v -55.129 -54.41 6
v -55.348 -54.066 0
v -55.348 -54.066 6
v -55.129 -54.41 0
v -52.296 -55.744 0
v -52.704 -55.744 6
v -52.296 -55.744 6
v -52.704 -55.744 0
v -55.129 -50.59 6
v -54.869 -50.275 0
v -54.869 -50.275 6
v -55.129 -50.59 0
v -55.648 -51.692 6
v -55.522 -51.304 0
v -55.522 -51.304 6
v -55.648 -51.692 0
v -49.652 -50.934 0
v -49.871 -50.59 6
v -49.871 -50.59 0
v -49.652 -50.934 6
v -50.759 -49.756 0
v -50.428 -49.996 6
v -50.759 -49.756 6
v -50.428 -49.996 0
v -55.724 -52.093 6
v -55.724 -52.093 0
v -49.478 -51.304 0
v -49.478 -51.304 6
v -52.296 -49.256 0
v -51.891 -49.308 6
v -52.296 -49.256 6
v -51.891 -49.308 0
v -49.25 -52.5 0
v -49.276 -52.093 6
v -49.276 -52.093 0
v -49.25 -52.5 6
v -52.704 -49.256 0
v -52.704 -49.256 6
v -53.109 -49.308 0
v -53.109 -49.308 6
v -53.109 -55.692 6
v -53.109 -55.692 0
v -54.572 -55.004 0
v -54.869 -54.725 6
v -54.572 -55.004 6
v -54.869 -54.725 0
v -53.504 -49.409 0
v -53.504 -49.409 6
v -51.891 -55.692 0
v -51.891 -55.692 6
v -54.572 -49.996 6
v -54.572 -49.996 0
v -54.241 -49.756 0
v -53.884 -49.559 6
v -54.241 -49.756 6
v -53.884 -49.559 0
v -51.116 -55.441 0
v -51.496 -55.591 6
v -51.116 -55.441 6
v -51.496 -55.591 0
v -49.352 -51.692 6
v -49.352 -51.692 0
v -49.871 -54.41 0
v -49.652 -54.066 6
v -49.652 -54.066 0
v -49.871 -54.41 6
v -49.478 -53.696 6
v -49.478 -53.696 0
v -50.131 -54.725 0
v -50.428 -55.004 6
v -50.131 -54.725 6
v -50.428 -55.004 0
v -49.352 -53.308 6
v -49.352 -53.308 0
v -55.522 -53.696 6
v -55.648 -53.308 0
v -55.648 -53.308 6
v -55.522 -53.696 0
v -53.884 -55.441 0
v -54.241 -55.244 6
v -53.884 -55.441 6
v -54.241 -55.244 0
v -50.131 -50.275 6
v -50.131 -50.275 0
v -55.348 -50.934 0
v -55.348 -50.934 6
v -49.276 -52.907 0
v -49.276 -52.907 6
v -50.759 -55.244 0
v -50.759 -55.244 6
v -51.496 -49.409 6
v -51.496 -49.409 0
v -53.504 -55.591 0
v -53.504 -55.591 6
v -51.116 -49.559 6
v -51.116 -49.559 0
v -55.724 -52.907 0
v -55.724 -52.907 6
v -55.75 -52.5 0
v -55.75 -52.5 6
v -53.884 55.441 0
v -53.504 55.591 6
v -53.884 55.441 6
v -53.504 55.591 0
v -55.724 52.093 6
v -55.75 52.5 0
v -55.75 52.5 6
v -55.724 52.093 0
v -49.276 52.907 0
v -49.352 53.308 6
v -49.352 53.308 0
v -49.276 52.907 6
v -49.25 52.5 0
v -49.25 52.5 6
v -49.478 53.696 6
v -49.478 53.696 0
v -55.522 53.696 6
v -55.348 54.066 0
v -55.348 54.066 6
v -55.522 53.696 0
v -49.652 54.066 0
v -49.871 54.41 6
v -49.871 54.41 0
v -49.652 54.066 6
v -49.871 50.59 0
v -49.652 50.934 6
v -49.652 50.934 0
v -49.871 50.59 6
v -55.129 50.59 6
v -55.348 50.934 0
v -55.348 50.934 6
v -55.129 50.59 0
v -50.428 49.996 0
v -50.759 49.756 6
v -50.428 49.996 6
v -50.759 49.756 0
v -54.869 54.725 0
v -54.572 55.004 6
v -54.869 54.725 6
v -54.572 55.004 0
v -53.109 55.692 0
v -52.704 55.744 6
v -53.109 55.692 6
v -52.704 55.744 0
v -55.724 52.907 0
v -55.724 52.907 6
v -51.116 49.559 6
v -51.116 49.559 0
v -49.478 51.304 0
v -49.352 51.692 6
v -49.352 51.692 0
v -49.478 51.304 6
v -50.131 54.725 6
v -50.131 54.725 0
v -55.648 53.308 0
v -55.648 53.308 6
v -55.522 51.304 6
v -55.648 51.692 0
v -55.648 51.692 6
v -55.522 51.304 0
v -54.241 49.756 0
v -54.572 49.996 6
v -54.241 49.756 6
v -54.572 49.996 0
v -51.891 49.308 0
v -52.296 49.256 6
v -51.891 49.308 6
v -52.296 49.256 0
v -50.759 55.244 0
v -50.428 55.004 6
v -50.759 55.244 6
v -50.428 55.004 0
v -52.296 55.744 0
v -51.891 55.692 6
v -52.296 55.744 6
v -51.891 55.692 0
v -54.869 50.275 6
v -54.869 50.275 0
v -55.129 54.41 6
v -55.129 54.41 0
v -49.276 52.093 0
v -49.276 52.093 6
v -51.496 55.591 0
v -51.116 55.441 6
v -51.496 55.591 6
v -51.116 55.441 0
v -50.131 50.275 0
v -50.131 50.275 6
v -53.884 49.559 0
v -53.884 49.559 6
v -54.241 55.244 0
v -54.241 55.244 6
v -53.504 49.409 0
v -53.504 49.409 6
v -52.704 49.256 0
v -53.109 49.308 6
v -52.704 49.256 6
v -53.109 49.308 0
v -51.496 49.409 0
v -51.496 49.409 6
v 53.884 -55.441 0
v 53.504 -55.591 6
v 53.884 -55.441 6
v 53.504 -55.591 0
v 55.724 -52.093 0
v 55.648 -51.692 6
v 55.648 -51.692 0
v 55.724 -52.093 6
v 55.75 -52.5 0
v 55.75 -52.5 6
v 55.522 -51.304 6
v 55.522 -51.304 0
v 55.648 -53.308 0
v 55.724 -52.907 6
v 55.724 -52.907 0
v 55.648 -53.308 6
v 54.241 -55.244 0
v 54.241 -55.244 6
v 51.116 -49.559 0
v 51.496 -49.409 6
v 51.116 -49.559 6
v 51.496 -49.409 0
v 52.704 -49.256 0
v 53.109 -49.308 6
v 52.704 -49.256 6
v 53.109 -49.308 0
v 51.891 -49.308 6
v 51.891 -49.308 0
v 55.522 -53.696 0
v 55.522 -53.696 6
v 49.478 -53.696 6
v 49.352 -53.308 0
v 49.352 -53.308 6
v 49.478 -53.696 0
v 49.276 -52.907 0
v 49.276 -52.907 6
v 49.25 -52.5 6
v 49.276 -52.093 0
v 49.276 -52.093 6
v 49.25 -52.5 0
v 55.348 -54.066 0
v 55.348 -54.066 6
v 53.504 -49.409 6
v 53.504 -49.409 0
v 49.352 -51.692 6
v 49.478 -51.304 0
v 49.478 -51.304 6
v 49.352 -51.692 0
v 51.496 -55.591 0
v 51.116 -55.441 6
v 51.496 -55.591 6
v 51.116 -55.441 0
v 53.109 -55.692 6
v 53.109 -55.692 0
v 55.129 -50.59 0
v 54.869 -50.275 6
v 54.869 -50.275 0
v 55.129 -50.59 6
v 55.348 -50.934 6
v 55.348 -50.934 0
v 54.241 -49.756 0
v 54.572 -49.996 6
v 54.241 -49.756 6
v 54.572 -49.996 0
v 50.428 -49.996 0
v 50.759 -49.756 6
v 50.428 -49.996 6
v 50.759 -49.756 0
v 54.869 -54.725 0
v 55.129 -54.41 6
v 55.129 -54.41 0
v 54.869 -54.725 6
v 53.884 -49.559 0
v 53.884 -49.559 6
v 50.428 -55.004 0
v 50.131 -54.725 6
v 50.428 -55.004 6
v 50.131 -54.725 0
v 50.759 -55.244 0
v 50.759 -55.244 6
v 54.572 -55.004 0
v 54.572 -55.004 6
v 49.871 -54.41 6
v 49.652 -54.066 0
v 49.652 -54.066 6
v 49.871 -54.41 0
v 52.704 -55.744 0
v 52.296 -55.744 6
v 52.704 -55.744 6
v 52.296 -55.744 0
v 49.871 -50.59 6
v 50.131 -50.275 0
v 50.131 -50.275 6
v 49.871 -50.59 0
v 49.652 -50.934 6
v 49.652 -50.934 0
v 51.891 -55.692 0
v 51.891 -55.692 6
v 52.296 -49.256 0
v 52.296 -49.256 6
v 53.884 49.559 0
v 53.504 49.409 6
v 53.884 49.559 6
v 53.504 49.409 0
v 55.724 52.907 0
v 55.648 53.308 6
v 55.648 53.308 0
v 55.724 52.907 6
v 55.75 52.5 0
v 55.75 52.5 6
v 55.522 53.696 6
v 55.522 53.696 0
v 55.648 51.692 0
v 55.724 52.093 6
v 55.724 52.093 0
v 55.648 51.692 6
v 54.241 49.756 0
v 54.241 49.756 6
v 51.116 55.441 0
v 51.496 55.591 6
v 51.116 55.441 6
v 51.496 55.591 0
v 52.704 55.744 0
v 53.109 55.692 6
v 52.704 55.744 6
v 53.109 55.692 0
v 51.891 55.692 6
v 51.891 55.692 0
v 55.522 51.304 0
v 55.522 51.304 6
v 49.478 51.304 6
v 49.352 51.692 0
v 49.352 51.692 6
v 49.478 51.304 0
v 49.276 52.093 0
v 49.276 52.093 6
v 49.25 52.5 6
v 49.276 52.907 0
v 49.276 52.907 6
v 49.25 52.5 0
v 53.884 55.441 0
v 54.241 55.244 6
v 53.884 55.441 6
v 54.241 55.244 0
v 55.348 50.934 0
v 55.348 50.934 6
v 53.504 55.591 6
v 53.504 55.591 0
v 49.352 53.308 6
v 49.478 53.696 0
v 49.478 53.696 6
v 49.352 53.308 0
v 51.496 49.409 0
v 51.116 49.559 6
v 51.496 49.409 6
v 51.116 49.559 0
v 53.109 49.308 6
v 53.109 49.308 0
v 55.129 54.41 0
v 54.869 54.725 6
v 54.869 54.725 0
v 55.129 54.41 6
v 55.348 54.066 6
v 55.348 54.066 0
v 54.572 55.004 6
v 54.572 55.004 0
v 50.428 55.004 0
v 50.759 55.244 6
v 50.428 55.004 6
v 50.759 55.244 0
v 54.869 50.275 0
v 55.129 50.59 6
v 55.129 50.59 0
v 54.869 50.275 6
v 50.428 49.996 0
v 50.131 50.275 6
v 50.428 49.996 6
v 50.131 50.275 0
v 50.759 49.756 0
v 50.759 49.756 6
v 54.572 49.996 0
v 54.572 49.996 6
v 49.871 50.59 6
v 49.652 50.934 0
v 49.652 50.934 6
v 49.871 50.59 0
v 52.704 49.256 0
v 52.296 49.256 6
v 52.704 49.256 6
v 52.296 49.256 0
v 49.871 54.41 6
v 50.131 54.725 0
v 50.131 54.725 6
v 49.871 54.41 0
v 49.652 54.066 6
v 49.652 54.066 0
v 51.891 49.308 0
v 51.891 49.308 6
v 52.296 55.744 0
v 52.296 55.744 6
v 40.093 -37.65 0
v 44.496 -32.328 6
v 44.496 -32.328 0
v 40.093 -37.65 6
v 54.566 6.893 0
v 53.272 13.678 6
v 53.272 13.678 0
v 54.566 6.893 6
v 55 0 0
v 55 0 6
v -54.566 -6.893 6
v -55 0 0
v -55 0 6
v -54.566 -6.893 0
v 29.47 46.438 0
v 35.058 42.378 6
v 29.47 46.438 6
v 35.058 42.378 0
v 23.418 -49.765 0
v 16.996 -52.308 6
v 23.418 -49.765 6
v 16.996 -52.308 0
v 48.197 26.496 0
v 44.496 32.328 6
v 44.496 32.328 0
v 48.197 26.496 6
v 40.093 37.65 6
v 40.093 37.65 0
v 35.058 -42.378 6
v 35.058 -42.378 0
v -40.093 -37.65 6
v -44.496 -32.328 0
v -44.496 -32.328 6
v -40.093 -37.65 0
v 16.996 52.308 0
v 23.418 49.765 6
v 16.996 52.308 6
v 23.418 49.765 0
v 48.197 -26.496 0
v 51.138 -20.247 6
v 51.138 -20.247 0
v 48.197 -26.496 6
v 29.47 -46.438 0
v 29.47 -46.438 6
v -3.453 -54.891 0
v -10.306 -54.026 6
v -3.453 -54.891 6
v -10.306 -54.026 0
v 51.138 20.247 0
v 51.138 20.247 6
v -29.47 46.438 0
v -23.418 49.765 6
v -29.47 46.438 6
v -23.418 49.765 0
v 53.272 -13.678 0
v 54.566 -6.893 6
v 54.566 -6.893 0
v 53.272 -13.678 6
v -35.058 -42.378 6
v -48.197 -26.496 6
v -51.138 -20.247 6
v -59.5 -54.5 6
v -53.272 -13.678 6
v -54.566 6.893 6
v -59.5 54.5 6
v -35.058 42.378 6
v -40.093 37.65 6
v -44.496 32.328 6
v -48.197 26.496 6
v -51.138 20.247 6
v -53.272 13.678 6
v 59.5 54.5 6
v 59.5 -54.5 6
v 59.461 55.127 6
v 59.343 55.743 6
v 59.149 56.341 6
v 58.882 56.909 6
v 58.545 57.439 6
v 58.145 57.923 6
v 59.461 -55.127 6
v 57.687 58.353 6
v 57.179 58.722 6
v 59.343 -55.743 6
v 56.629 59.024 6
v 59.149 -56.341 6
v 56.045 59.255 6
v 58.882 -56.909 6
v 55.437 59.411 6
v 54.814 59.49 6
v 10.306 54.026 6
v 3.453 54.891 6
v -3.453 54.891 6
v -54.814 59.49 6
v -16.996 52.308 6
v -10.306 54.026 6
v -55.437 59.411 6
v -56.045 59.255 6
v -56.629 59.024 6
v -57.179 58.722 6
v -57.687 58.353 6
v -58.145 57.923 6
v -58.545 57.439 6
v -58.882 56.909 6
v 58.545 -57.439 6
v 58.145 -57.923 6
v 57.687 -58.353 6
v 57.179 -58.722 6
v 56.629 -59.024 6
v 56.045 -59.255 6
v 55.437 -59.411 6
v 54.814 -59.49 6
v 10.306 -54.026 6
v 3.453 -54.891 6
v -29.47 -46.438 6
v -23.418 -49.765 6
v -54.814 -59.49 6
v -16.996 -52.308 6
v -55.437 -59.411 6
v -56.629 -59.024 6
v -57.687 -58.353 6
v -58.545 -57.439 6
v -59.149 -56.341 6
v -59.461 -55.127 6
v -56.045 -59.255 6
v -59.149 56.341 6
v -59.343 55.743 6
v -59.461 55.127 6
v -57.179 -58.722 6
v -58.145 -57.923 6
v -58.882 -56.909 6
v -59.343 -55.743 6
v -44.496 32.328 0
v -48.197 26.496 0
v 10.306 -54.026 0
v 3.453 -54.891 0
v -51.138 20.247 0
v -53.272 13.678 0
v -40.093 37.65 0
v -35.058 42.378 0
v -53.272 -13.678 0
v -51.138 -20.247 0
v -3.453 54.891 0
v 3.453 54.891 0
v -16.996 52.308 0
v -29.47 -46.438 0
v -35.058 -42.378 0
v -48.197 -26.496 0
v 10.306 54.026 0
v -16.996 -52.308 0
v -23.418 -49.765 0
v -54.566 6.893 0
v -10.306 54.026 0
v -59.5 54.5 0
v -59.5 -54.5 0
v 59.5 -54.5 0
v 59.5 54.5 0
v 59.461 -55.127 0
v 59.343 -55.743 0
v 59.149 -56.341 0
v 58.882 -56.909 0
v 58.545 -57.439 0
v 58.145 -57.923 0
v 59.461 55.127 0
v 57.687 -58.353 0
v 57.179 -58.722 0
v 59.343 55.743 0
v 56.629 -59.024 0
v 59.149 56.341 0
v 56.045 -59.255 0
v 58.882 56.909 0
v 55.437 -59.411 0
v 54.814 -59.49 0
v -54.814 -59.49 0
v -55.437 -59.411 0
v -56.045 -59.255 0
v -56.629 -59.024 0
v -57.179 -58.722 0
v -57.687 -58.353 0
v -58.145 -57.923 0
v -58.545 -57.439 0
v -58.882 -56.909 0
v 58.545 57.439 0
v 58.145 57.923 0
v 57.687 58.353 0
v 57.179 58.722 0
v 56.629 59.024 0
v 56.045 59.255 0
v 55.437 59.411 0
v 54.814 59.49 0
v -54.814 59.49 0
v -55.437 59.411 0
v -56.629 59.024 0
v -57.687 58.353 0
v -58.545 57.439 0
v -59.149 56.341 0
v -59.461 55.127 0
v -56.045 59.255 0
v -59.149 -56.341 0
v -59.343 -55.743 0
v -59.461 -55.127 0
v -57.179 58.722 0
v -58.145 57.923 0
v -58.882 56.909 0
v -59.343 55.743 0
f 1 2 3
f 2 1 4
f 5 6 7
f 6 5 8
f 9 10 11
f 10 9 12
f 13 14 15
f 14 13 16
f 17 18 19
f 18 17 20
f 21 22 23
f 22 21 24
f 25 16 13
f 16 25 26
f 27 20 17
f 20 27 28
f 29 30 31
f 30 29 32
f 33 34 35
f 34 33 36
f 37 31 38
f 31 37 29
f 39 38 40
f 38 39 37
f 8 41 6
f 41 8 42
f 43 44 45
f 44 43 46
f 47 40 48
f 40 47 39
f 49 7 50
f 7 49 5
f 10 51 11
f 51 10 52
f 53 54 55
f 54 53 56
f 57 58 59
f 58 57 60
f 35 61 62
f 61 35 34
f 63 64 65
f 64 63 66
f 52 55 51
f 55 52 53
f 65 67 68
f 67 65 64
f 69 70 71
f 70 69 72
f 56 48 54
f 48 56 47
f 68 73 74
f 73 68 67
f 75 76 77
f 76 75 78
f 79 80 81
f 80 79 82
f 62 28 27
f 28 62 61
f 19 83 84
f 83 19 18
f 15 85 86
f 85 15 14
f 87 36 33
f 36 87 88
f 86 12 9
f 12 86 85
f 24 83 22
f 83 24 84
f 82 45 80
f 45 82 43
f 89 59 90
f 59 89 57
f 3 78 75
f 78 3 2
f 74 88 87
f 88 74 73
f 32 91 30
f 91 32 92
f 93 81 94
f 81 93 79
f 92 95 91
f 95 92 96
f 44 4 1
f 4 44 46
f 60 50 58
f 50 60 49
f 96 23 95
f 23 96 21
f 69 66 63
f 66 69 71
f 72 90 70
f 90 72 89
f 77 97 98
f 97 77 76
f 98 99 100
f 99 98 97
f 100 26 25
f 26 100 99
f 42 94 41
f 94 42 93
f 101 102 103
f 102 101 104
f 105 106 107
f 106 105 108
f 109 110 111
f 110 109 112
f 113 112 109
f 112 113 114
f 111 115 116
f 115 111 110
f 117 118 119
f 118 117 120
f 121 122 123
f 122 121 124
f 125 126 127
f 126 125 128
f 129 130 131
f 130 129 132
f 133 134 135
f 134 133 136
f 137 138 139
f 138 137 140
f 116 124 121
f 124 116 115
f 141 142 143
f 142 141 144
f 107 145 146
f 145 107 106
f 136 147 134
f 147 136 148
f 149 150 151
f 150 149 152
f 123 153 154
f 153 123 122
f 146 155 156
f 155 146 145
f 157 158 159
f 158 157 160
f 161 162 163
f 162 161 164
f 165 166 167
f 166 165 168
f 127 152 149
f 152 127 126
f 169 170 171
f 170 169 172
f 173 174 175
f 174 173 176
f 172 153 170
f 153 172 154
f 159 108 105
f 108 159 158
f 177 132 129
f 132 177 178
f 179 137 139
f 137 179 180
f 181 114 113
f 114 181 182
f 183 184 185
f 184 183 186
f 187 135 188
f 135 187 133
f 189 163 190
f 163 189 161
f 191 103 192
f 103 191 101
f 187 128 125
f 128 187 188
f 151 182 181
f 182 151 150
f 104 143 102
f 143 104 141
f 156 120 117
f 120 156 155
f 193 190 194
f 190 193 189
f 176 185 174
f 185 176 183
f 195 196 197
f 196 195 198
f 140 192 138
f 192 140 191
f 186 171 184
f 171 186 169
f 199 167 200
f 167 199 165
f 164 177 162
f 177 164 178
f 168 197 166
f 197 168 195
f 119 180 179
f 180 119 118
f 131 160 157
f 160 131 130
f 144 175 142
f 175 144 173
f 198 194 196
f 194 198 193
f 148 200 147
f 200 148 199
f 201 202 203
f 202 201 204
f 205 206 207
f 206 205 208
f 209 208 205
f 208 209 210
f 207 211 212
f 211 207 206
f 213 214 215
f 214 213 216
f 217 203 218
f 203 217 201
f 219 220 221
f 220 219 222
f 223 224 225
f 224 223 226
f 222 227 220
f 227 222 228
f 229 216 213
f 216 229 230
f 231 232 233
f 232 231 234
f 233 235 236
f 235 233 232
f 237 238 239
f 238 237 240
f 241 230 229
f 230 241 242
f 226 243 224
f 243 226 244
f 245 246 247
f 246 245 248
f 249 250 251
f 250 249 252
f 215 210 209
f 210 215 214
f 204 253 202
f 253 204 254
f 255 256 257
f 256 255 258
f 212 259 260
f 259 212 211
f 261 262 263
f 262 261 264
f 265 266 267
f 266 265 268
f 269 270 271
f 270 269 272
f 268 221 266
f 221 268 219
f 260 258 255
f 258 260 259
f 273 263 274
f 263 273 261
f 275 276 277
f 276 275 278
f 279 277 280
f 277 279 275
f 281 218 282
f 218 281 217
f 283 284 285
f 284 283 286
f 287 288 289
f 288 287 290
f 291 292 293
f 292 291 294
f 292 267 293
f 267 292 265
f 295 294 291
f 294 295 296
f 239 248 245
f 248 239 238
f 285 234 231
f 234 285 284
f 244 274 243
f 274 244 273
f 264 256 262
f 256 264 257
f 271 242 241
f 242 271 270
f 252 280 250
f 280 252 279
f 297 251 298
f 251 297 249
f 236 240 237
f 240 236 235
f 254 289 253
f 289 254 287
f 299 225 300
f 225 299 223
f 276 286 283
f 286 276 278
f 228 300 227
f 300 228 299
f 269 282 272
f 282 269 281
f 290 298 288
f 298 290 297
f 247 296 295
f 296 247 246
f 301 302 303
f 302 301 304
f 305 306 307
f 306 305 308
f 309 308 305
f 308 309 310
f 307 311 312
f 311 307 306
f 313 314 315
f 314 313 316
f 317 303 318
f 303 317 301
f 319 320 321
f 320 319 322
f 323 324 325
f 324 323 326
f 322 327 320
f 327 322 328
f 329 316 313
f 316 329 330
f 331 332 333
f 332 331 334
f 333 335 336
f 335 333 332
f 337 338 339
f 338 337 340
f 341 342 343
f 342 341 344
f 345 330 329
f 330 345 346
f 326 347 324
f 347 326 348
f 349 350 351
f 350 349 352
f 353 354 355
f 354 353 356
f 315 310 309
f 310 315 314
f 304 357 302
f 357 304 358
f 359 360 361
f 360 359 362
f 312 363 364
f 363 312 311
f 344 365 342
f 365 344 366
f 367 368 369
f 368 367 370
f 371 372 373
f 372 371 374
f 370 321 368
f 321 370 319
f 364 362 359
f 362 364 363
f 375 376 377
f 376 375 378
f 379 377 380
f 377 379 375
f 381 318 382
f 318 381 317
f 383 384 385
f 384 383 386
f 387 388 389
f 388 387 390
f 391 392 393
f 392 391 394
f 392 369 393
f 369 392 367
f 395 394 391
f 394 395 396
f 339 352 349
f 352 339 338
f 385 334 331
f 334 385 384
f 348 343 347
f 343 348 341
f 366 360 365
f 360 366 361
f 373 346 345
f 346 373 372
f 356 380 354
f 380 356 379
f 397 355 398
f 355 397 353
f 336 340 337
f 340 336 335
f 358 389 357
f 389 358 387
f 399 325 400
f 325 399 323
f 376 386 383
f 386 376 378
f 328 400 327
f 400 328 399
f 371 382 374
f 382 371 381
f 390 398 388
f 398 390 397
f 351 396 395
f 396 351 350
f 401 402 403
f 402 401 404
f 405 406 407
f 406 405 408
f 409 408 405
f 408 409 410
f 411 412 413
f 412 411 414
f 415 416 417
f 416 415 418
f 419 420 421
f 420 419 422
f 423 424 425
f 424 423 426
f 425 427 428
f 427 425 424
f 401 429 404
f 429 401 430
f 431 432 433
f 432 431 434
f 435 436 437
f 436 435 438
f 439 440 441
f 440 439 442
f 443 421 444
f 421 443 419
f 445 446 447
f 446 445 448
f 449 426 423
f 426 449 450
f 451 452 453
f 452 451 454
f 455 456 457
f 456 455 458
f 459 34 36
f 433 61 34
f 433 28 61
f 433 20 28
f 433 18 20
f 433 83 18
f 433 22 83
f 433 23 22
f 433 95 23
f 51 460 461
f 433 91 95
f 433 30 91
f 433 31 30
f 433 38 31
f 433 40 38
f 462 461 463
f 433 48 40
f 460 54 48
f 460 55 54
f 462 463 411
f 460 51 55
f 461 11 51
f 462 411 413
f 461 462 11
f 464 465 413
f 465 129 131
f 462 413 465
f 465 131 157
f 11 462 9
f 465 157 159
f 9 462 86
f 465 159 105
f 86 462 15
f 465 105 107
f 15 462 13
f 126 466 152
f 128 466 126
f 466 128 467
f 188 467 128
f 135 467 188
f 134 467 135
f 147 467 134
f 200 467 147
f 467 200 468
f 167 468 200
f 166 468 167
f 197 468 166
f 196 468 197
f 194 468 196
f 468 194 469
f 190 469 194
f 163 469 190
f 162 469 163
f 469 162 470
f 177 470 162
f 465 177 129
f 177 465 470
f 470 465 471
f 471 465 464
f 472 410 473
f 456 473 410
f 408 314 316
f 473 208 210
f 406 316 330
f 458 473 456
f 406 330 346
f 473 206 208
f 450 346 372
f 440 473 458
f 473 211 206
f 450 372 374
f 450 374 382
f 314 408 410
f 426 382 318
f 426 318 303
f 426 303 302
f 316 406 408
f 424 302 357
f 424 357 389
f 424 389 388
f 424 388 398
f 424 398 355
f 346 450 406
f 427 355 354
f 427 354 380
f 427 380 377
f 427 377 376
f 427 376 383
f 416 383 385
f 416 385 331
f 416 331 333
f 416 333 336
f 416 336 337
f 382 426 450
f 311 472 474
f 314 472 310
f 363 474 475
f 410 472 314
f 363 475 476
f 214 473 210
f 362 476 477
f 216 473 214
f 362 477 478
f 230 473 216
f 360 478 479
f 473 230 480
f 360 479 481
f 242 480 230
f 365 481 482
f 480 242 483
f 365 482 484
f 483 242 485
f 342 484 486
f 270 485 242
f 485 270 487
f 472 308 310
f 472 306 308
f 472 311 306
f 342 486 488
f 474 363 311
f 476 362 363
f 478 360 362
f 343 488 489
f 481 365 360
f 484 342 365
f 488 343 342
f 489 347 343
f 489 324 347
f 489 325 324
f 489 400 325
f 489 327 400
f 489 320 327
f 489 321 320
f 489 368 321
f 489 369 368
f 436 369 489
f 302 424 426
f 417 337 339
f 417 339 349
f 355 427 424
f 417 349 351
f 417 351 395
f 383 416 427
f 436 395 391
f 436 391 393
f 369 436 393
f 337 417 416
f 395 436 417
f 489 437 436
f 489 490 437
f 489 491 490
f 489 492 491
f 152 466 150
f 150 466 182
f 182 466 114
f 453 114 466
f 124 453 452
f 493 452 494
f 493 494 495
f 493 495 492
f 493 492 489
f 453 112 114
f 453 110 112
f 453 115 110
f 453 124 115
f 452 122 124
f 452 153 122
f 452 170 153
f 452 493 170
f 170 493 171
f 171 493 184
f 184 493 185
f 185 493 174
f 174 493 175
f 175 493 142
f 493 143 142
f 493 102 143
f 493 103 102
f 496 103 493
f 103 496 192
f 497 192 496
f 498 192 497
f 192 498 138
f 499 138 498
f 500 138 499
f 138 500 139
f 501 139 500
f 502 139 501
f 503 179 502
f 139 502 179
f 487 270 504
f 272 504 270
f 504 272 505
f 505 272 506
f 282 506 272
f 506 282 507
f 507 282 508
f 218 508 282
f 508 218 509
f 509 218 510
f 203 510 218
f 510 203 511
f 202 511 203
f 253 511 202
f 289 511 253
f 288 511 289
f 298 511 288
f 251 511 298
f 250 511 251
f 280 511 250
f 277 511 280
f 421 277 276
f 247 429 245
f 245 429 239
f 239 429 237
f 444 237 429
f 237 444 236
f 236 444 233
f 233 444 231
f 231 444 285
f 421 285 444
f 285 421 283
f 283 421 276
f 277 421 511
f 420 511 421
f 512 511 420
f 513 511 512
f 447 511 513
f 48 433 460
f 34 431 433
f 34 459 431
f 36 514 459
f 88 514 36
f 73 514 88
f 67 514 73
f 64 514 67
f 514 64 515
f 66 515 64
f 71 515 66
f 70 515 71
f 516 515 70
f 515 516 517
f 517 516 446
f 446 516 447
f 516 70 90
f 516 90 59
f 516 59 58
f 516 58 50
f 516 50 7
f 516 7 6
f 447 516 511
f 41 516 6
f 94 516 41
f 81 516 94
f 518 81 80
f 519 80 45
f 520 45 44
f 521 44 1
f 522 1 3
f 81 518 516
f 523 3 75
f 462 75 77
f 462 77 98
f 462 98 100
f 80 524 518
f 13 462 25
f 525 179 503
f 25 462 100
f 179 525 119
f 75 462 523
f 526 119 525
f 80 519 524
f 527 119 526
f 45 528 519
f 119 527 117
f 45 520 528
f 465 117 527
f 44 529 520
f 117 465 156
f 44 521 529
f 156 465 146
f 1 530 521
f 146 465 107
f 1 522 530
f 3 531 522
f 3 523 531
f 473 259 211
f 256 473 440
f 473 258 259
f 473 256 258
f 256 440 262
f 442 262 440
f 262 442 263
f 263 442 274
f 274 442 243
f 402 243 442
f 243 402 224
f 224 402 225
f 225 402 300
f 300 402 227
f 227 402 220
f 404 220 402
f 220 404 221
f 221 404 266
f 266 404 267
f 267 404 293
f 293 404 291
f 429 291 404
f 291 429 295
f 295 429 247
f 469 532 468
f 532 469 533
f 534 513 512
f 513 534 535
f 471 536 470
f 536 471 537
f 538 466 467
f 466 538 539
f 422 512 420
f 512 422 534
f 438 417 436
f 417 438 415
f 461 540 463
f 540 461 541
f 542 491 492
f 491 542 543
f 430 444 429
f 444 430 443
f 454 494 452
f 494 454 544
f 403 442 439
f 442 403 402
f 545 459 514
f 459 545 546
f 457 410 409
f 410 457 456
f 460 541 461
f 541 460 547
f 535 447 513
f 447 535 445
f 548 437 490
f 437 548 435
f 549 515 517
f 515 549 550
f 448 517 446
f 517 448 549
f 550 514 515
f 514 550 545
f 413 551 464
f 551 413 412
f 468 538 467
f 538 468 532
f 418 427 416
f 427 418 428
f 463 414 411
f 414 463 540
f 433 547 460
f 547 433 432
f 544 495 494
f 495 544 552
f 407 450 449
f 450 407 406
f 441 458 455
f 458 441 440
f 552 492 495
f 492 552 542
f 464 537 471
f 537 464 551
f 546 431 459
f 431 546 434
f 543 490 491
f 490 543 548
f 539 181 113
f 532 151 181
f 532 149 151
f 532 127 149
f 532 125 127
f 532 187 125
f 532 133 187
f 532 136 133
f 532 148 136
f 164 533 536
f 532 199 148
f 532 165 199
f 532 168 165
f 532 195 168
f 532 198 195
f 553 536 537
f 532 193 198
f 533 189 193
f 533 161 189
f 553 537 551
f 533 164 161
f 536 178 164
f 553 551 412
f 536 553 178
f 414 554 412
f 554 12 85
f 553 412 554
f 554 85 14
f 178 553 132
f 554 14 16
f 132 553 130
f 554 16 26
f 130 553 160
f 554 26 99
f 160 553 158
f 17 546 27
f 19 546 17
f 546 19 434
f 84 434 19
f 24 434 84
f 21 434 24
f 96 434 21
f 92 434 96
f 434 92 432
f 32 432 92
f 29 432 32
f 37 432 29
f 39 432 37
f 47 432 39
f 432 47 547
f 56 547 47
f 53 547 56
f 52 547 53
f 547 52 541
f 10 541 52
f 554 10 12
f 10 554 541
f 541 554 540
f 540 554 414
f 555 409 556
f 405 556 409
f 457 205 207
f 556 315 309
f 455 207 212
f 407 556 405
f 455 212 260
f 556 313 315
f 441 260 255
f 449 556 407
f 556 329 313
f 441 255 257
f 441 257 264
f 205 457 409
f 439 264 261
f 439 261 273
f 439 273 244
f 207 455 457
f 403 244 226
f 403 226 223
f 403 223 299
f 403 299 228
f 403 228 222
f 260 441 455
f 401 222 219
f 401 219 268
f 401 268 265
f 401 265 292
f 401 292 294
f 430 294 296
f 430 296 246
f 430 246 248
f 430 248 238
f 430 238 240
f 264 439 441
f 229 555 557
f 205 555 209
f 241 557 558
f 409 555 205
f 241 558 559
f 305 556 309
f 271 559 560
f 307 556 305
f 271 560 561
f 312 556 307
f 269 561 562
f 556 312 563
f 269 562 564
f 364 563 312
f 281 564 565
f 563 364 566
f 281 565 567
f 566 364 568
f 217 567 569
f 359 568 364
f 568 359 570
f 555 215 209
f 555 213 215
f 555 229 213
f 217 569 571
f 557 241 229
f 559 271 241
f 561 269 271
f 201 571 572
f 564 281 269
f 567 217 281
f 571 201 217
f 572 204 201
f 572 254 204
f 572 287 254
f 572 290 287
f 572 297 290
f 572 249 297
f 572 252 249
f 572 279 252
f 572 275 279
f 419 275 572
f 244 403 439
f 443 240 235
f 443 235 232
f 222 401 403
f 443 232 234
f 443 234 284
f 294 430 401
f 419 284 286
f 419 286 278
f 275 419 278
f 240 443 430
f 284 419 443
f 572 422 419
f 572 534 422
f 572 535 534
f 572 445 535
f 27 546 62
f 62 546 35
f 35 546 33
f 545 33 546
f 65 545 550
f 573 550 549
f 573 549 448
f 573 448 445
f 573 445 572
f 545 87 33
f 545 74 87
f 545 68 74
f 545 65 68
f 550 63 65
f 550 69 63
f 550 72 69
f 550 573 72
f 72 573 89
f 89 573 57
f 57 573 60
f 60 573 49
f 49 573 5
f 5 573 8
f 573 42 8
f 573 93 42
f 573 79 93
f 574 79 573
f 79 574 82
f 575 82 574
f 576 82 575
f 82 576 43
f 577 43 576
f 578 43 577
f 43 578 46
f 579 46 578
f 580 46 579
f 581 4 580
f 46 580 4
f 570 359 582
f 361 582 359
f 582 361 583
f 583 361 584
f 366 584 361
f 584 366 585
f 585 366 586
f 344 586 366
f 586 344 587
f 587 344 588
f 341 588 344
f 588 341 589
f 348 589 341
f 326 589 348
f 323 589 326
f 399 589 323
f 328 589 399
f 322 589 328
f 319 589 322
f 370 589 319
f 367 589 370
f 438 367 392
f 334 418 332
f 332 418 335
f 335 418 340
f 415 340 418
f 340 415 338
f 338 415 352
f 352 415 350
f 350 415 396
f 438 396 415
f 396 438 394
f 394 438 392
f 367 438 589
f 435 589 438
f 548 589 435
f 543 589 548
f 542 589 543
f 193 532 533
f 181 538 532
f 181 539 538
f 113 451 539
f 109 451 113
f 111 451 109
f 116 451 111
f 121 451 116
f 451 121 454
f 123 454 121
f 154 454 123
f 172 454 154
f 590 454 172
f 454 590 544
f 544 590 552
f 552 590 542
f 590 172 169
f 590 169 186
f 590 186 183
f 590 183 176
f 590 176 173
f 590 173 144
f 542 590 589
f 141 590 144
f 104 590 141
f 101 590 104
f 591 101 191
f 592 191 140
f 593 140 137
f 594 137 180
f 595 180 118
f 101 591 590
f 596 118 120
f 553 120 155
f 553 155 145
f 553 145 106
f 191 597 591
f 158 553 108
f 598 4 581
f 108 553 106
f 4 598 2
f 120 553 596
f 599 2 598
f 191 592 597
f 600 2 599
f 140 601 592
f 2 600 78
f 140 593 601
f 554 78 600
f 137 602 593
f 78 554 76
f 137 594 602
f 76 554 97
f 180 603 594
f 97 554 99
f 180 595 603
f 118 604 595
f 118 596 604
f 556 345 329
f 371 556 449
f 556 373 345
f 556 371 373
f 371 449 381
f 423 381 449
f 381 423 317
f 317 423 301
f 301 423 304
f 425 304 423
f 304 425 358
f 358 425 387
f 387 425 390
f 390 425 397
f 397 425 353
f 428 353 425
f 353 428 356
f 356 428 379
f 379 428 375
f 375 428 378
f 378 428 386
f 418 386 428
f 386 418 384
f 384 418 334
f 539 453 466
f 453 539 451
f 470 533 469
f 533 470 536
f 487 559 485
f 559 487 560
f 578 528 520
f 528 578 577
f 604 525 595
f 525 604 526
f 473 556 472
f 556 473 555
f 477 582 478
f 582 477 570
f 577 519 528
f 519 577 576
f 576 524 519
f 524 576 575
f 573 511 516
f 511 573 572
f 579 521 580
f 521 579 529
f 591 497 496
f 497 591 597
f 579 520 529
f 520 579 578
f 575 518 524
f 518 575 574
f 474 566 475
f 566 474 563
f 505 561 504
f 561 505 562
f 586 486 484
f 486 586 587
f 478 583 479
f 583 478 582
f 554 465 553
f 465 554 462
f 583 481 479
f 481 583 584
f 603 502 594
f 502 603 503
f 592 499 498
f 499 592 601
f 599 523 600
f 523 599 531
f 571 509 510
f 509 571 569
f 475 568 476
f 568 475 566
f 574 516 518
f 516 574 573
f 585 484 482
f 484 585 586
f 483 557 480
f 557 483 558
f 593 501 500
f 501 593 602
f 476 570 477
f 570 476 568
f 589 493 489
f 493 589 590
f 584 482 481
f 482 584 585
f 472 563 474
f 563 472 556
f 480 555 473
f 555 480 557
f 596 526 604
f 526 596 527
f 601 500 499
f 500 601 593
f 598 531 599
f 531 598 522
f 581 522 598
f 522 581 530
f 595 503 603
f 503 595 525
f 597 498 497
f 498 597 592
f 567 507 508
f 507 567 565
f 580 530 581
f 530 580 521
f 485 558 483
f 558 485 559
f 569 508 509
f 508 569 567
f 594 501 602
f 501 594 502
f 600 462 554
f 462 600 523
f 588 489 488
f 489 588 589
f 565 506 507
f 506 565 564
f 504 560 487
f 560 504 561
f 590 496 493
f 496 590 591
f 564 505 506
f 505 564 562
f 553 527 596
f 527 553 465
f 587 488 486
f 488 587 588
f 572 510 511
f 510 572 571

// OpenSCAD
$fn = 50;


difference() {
	union() {
		hull() {
			translate(v = [-54.5000000000, 54.5000000000, 0]) {
				cylinder(h = 6, r = 5);
			}
			translate(v = [54.5000000000, 54.5000000000, 0]) {
				cylinder(h = 6, r = 5);
			}
			translate(v = [-54.5000000000, -54.5000000000, 0]) {
				cylinder(h = 6, r = 5);
			}
			translate(v = [54.5000000000, -54.5000000000, 0]) {
				cylinder(h = 6, r = 5);
			}
		}
	}
	union() {
		#translate(v = [-52.5000000000, -52.5000000000, -100.0000000000]) {
			cylinder(h = 200, r = 3.2500000000);
		}
		#translate(v = [-52.5000000000, 52.5000000000, -100.0000000000]) {
			cylinder(h = 200, r = 3.2500000000);
		}
		#translate(v = [52.5000000000, -52.5000000000, -100.0000000000]) {
			cylinder(h = 200, r = 3.2500000000);
		}
		#translate(v = [52.5000000000, 52.5000000000, -100.0000000000]) {
			cylinder(h = 200, r = 3.2500000000);
		}
		#cylinder(h = 6, r = 55.0000000000);
	}
}
